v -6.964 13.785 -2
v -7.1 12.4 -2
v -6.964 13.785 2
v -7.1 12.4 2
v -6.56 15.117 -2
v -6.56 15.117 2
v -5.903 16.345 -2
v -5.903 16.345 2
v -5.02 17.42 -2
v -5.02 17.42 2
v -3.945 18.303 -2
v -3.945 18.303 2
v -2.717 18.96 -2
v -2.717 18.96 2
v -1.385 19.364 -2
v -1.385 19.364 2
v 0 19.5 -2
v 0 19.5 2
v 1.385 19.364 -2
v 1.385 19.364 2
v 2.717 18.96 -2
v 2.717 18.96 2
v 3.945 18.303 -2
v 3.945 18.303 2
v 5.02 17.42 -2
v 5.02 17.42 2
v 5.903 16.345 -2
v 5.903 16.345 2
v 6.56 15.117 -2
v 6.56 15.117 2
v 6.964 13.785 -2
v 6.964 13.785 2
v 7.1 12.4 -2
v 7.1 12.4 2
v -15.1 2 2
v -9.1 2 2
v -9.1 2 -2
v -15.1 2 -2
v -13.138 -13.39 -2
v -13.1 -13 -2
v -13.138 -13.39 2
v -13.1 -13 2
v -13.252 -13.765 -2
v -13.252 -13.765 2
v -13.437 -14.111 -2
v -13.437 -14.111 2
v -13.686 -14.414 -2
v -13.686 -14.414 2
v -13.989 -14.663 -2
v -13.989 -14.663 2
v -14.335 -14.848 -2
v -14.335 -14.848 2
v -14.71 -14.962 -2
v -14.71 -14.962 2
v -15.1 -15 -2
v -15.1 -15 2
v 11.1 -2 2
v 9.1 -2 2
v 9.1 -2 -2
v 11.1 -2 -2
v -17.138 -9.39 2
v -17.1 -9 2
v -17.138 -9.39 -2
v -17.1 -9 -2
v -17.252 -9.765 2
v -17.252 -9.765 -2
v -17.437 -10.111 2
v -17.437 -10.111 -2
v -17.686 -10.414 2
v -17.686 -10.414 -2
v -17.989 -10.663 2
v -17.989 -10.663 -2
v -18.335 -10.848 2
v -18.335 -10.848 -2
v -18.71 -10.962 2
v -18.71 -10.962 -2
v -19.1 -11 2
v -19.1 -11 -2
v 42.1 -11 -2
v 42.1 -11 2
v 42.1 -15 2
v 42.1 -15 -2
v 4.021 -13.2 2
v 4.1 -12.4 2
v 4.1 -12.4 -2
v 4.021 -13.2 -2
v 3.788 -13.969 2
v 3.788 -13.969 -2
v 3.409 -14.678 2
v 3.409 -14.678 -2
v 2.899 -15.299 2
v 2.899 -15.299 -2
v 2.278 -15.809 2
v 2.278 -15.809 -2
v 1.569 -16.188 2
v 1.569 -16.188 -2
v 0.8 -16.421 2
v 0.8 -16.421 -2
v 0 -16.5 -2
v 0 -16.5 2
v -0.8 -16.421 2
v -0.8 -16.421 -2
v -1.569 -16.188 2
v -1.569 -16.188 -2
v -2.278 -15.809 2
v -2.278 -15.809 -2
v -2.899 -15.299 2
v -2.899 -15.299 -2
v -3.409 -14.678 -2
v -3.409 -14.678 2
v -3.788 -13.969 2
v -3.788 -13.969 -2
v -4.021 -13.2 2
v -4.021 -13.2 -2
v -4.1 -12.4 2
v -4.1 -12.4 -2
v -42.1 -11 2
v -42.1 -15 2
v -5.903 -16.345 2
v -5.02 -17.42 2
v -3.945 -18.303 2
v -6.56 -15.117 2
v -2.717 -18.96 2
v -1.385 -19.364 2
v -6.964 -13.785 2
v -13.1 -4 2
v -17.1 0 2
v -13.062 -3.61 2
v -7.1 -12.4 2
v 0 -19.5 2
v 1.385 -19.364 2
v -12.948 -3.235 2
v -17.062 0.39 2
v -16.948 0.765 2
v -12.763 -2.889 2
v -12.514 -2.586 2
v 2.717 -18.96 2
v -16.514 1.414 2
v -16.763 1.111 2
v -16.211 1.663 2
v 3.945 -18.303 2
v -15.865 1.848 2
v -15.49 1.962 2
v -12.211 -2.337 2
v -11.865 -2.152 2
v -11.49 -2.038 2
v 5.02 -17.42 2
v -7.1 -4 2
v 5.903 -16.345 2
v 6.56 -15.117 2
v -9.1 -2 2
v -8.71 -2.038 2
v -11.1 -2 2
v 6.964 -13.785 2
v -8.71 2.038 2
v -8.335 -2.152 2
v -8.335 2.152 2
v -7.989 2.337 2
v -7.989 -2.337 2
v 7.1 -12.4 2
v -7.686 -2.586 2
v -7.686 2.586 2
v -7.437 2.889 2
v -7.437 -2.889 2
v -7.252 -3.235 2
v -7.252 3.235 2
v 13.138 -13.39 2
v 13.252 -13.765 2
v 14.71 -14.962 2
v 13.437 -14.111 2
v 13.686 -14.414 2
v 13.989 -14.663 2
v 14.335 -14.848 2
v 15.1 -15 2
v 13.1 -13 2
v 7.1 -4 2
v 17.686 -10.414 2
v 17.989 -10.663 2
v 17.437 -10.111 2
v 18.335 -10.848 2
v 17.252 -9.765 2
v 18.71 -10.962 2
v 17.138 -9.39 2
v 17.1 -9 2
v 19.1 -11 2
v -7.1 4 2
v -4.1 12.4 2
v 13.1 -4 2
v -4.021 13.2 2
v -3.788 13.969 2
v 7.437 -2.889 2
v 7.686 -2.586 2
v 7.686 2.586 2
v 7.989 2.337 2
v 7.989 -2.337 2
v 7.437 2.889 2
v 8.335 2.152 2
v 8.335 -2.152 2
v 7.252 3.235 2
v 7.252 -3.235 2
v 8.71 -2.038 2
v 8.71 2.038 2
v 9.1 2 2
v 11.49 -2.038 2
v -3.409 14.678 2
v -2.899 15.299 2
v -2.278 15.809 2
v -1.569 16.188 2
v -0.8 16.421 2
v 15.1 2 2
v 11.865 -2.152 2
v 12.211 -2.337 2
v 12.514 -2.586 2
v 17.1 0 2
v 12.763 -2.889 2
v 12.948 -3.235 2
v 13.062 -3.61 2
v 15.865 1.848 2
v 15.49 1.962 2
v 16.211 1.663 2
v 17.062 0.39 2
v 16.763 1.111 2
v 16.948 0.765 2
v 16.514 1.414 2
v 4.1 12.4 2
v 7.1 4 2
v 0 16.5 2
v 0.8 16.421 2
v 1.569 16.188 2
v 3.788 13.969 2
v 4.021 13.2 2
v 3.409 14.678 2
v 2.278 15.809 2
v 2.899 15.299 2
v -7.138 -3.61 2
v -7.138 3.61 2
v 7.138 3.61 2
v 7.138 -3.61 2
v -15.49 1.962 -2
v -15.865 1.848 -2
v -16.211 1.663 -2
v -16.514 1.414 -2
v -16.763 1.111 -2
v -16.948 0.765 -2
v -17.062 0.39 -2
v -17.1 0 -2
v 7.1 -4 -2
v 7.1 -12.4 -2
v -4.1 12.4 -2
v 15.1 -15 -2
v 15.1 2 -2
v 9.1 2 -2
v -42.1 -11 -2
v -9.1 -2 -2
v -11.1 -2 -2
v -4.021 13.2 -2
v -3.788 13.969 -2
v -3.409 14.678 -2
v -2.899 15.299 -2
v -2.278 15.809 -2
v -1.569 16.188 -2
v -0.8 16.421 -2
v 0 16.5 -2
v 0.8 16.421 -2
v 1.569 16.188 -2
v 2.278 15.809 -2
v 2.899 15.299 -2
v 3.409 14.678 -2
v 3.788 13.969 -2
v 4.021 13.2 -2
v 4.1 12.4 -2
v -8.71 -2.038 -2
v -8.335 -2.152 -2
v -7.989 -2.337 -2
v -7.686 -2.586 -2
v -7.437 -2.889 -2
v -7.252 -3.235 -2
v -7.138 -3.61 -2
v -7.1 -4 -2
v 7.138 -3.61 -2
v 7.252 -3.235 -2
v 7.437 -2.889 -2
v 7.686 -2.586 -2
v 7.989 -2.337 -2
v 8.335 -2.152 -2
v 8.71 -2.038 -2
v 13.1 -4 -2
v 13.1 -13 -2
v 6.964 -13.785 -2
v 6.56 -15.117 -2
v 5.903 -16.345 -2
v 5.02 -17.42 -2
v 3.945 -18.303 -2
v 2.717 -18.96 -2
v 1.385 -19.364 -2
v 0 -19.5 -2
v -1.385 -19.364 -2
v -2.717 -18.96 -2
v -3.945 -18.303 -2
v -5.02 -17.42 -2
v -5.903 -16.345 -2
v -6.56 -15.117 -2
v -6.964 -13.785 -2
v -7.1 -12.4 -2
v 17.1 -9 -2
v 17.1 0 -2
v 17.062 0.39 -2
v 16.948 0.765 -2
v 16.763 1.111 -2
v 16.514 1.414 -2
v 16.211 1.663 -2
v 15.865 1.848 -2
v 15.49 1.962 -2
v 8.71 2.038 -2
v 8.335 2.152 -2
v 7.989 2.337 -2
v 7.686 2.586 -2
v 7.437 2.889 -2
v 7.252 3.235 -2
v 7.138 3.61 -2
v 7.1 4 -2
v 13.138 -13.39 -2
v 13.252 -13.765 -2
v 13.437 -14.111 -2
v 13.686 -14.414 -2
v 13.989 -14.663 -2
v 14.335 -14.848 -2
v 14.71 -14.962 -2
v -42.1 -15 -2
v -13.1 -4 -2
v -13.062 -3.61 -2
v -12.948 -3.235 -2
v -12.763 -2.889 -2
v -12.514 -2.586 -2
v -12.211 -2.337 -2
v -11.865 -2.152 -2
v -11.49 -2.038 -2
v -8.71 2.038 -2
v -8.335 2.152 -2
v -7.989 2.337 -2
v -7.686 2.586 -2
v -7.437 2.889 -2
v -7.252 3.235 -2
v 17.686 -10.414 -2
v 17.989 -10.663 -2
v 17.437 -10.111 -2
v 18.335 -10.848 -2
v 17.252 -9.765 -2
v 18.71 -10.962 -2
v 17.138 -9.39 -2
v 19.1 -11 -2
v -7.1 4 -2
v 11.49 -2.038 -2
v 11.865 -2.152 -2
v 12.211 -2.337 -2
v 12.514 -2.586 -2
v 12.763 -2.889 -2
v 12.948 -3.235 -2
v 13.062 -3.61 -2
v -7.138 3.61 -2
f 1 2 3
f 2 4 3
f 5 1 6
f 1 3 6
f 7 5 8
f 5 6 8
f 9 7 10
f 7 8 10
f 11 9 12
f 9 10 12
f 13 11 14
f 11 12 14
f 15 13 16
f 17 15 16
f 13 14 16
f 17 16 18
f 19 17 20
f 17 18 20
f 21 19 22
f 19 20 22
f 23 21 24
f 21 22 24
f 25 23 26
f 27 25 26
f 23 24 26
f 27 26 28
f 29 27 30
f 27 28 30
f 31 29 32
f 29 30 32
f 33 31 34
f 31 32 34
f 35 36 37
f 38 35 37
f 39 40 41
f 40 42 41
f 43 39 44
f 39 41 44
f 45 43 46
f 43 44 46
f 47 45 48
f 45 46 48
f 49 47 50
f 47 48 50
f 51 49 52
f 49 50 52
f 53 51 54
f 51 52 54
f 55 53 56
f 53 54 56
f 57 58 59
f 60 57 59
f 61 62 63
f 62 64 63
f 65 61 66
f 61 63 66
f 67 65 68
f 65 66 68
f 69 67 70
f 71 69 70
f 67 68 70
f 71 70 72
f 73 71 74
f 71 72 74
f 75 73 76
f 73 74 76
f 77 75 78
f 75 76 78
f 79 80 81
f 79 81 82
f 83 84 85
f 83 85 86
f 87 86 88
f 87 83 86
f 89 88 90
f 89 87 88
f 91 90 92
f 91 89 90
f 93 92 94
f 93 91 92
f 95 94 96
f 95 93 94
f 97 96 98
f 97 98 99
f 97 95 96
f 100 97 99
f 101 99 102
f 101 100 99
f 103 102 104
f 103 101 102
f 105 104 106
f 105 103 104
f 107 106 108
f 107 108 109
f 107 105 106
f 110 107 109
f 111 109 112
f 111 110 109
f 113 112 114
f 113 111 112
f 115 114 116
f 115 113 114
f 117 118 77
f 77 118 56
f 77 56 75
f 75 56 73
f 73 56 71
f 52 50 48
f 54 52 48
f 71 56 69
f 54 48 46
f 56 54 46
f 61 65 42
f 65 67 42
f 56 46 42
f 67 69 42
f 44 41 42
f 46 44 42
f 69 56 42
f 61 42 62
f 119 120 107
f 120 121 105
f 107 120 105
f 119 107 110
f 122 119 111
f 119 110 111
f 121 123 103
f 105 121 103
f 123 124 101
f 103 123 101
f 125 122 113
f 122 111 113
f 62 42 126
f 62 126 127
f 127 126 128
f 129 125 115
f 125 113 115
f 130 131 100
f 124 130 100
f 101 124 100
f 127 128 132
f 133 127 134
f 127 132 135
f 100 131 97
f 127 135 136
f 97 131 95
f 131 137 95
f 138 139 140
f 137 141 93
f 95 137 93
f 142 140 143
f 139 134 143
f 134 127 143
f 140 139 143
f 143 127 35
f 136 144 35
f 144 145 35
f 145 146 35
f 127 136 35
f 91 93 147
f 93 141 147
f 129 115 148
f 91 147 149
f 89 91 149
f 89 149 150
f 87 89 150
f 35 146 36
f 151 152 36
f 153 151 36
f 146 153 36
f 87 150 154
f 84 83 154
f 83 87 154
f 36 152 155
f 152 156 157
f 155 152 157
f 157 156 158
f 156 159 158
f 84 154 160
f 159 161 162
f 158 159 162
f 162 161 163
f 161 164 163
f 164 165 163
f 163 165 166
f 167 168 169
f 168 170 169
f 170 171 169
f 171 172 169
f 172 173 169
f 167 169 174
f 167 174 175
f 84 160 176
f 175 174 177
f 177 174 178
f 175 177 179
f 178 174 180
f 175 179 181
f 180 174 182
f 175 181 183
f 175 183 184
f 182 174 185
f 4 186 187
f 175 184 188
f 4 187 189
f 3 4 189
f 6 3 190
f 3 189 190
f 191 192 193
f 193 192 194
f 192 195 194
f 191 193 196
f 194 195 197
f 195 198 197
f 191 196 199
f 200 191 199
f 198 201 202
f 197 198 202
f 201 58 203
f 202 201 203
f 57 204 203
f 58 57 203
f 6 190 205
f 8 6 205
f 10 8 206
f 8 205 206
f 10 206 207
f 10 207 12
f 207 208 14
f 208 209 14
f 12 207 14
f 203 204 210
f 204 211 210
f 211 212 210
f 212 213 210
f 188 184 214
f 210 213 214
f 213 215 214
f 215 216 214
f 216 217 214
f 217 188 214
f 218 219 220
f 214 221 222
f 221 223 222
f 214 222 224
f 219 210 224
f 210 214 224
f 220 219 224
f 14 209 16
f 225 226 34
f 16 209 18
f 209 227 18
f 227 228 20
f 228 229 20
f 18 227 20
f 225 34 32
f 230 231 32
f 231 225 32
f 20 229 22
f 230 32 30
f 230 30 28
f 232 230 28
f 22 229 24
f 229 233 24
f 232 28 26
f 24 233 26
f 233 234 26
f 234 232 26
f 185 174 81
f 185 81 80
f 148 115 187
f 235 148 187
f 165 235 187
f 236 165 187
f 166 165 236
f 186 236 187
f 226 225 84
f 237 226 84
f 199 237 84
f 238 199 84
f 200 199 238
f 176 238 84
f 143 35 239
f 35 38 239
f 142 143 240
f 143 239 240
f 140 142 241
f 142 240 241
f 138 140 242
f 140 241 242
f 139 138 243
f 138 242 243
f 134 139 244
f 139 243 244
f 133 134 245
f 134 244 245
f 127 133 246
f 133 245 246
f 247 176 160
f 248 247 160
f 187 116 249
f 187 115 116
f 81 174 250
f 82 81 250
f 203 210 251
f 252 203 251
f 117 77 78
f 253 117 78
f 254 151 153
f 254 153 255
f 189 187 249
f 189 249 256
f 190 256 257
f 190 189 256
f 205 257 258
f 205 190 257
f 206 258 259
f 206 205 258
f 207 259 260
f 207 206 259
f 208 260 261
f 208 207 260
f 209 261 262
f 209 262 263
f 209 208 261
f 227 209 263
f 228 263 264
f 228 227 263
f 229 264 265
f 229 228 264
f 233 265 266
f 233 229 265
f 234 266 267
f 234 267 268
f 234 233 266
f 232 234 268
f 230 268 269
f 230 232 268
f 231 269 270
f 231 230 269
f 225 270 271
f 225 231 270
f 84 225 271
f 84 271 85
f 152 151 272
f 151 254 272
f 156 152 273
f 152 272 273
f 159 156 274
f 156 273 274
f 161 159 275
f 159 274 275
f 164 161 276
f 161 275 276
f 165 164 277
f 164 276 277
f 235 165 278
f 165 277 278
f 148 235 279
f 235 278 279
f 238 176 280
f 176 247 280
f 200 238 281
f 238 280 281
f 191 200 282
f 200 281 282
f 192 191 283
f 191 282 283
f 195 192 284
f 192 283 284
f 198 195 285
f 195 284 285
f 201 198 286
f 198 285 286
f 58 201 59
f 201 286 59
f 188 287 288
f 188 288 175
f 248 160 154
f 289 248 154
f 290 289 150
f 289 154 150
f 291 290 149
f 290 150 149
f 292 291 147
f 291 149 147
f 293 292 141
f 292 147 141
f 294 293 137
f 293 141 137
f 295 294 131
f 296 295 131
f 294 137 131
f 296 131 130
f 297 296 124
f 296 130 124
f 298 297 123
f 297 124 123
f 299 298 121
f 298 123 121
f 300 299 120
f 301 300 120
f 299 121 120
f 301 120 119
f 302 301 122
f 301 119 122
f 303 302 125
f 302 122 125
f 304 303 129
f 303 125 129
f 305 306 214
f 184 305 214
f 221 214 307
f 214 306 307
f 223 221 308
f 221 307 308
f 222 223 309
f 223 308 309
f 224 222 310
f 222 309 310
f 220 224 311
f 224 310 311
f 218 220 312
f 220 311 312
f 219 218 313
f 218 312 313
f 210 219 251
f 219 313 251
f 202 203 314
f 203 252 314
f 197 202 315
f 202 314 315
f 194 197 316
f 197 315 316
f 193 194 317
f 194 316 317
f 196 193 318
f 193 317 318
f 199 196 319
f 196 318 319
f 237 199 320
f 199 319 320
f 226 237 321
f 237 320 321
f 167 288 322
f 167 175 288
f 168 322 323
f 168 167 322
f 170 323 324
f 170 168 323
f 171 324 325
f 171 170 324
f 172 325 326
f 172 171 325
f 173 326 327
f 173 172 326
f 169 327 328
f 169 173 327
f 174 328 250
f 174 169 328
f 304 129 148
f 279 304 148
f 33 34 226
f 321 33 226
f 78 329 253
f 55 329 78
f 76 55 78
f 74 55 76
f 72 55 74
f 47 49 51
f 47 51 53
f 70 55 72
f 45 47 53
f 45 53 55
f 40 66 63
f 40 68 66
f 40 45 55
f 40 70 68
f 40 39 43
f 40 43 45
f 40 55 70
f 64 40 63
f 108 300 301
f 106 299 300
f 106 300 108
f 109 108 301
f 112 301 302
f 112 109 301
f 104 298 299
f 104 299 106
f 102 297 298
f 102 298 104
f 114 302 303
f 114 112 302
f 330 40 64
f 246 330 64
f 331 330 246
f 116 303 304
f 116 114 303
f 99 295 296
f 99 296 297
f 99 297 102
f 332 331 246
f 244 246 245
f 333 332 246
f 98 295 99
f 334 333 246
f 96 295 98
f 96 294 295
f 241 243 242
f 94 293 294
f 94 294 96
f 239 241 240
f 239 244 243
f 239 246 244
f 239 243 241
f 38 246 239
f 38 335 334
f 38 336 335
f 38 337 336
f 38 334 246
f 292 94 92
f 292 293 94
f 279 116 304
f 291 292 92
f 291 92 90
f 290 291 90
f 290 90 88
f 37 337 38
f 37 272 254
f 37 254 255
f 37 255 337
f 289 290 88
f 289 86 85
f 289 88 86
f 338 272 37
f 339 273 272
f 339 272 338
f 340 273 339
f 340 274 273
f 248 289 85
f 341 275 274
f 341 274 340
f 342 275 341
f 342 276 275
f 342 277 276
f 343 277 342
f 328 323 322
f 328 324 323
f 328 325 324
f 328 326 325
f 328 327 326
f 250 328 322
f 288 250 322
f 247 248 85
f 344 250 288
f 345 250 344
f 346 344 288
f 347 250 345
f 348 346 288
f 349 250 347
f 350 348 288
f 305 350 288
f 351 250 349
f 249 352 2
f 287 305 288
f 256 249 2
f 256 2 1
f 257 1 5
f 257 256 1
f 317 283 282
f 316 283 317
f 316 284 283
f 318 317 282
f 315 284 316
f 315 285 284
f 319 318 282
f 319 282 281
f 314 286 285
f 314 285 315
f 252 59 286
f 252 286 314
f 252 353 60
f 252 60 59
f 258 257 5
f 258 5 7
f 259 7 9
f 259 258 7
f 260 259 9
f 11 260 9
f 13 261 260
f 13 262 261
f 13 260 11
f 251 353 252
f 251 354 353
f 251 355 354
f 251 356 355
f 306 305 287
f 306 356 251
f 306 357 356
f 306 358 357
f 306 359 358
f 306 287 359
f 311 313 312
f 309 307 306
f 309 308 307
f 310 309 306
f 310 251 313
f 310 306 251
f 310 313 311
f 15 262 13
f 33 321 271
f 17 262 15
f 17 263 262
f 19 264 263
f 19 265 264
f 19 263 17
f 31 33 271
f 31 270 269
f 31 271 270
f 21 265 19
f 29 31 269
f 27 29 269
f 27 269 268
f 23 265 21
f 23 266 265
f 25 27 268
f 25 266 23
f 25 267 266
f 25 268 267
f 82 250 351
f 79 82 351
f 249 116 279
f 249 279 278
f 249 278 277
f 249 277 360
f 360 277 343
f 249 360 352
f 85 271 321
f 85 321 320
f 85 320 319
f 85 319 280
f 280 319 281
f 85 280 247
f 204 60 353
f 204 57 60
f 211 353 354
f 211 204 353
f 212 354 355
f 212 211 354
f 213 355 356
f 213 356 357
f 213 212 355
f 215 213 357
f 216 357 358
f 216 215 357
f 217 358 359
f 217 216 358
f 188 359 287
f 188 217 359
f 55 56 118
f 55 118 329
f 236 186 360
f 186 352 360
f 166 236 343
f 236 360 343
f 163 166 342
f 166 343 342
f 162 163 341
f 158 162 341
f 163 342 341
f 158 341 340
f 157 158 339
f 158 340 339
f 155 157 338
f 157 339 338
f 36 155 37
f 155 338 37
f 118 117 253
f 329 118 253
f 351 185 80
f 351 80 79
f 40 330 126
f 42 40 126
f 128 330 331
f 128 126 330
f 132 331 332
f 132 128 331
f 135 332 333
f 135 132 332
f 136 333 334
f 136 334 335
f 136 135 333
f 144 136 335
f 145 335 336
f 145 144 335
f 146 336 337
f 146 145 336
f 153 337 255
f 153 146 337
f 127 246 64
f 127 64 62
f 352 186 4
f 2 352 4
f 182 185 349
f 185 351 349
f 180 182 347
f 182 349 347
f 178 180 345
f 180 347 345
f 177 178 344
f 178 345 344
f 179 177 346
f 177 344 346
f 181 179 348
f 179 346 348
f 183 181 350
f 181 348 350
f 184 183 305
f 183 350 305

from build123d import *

# Parameters (mm, degrees)
BOSS_EXTRUDE1_DEPTH = 2
SKETCH2_W           = 4
SKETCH2_H           = 4
BOSS_EXTRUDE2_DEPTH = 10
SKETCH4_W           = 4
SKETCH4_H           = 4
BOSS_EXTRUDE4_DEPTH = 13
SKETCH5_W           = 4
SKETCH5_H           = 4
BOSS_EXTRUDE5_DEPTH = 25
FILLET2_R           = 2


with BuildPart() as part:
    # Sketch1 → Boss-Extrude1 (new, symmetric)
    with BuildSketch(Plane.XY):
        with BuildLine():
            Line((-7.1, -12.4), (-7.1, 12.4))
            ThreePointArc((-7.1, 12.4), (0, 19.5), (7.1, 12.4))
            Line((7.1, 12.4), (7.1, -12.4))
            ThreePointArc((7.1, -12.4), (0, -19.5), (-7.1, -12.4))
        make_face()
        with BuildLine():
            Line((-4.1, -12.4), (-4.1, 12.4))
            ThreePointArc((-4.1, 12.4), (0, 16.5), (4.1, 12.4))
            Line((4.1, 12.4), (4.1, -12.4))
            ThreePointArc((4.1, -12.4), (0, -16.5), (-4.1, -12.4))
        make_face(mode=Mode.SUBTRACT)
    extrude(amount=BOSS_EXTRUDE1_DEPTH, both=True)

    # Sketch2 → Boss-Extrude2 (add)
    with BuildSketch(Plane(origin=(7.1, 0, 0), x_dir=(0, 0, -1), z_dir=(1, 0, 0))):
        Rectangle(SKETCH2_W, SKETCH2_H)
    boss_extrude2 = extrude(amount=BOSS_EXTRUDE2_DEPTH)

    # Sketch4 → Boss-Extrude4 (add)
    with BuildSketch(Plane.XZ.offset(2)):
        with Locations((15.1, 0)):
            Rectangle(SKETCH4_W, SKETCH4_H)
    boss_extrude4 = extrude(amount=BOSS_EXTRUDE4_DEPTH)

    # Sketch5 → Boss-Extrude5 (add)
    with BuildSketch(Plane(origin=(17.1, 0, 0), x_dir=(0, 0, -1), z_dir=(1, 0, 0))):
        with Locations((0, -13)):
            Rectangle(SKETCH5_W, SKETCH5_H)
    boss_extrude5 = extrude(amount=BOSS_EXTRUDE5_DEPTH)

    # Mirror2: Boss-Extrude2, Boss-Extrude4, Boss-Extrude5 across plane
    add(boss_extrude2.mirror(Plane(origin=(0, 0, 0), x_dir=(0, 0, 1), z_dir=(1, 0, 0))))
    add(boss_extrude4.mirror(Plane(origin=(0, 0, 0), x_dir=(0, 0, 1), z_dir=(1, 0, 0))))
    add(boss_extrude5.mirror(Plane(origin=(0, 0, 0), x_dir=(0, 0, 1), z_dir=(1, 0, 0))))

    # Fillet2
    fillet2_edges = [part.edges().sort_by_distance(p)[0] for p in [
        (7.1, 2, 0),
        (7.1, -2, 0),
        (17.1, 2, 0),
        (13.1, -2, 0),
        (13.1, -15, 0),
        (17.1, -11, 0),
        (-17.1, 2, 0),
        (-7.1, 2, 0),
        (-7.1, -2, 0),
        (-13.1, -15, 0),
        (-13.1, -2, 0),
        (-17.1, -11, 0),
    ]]
    fillet(fillet2_edges, radius=FILLET2_R)


solid = part.part
